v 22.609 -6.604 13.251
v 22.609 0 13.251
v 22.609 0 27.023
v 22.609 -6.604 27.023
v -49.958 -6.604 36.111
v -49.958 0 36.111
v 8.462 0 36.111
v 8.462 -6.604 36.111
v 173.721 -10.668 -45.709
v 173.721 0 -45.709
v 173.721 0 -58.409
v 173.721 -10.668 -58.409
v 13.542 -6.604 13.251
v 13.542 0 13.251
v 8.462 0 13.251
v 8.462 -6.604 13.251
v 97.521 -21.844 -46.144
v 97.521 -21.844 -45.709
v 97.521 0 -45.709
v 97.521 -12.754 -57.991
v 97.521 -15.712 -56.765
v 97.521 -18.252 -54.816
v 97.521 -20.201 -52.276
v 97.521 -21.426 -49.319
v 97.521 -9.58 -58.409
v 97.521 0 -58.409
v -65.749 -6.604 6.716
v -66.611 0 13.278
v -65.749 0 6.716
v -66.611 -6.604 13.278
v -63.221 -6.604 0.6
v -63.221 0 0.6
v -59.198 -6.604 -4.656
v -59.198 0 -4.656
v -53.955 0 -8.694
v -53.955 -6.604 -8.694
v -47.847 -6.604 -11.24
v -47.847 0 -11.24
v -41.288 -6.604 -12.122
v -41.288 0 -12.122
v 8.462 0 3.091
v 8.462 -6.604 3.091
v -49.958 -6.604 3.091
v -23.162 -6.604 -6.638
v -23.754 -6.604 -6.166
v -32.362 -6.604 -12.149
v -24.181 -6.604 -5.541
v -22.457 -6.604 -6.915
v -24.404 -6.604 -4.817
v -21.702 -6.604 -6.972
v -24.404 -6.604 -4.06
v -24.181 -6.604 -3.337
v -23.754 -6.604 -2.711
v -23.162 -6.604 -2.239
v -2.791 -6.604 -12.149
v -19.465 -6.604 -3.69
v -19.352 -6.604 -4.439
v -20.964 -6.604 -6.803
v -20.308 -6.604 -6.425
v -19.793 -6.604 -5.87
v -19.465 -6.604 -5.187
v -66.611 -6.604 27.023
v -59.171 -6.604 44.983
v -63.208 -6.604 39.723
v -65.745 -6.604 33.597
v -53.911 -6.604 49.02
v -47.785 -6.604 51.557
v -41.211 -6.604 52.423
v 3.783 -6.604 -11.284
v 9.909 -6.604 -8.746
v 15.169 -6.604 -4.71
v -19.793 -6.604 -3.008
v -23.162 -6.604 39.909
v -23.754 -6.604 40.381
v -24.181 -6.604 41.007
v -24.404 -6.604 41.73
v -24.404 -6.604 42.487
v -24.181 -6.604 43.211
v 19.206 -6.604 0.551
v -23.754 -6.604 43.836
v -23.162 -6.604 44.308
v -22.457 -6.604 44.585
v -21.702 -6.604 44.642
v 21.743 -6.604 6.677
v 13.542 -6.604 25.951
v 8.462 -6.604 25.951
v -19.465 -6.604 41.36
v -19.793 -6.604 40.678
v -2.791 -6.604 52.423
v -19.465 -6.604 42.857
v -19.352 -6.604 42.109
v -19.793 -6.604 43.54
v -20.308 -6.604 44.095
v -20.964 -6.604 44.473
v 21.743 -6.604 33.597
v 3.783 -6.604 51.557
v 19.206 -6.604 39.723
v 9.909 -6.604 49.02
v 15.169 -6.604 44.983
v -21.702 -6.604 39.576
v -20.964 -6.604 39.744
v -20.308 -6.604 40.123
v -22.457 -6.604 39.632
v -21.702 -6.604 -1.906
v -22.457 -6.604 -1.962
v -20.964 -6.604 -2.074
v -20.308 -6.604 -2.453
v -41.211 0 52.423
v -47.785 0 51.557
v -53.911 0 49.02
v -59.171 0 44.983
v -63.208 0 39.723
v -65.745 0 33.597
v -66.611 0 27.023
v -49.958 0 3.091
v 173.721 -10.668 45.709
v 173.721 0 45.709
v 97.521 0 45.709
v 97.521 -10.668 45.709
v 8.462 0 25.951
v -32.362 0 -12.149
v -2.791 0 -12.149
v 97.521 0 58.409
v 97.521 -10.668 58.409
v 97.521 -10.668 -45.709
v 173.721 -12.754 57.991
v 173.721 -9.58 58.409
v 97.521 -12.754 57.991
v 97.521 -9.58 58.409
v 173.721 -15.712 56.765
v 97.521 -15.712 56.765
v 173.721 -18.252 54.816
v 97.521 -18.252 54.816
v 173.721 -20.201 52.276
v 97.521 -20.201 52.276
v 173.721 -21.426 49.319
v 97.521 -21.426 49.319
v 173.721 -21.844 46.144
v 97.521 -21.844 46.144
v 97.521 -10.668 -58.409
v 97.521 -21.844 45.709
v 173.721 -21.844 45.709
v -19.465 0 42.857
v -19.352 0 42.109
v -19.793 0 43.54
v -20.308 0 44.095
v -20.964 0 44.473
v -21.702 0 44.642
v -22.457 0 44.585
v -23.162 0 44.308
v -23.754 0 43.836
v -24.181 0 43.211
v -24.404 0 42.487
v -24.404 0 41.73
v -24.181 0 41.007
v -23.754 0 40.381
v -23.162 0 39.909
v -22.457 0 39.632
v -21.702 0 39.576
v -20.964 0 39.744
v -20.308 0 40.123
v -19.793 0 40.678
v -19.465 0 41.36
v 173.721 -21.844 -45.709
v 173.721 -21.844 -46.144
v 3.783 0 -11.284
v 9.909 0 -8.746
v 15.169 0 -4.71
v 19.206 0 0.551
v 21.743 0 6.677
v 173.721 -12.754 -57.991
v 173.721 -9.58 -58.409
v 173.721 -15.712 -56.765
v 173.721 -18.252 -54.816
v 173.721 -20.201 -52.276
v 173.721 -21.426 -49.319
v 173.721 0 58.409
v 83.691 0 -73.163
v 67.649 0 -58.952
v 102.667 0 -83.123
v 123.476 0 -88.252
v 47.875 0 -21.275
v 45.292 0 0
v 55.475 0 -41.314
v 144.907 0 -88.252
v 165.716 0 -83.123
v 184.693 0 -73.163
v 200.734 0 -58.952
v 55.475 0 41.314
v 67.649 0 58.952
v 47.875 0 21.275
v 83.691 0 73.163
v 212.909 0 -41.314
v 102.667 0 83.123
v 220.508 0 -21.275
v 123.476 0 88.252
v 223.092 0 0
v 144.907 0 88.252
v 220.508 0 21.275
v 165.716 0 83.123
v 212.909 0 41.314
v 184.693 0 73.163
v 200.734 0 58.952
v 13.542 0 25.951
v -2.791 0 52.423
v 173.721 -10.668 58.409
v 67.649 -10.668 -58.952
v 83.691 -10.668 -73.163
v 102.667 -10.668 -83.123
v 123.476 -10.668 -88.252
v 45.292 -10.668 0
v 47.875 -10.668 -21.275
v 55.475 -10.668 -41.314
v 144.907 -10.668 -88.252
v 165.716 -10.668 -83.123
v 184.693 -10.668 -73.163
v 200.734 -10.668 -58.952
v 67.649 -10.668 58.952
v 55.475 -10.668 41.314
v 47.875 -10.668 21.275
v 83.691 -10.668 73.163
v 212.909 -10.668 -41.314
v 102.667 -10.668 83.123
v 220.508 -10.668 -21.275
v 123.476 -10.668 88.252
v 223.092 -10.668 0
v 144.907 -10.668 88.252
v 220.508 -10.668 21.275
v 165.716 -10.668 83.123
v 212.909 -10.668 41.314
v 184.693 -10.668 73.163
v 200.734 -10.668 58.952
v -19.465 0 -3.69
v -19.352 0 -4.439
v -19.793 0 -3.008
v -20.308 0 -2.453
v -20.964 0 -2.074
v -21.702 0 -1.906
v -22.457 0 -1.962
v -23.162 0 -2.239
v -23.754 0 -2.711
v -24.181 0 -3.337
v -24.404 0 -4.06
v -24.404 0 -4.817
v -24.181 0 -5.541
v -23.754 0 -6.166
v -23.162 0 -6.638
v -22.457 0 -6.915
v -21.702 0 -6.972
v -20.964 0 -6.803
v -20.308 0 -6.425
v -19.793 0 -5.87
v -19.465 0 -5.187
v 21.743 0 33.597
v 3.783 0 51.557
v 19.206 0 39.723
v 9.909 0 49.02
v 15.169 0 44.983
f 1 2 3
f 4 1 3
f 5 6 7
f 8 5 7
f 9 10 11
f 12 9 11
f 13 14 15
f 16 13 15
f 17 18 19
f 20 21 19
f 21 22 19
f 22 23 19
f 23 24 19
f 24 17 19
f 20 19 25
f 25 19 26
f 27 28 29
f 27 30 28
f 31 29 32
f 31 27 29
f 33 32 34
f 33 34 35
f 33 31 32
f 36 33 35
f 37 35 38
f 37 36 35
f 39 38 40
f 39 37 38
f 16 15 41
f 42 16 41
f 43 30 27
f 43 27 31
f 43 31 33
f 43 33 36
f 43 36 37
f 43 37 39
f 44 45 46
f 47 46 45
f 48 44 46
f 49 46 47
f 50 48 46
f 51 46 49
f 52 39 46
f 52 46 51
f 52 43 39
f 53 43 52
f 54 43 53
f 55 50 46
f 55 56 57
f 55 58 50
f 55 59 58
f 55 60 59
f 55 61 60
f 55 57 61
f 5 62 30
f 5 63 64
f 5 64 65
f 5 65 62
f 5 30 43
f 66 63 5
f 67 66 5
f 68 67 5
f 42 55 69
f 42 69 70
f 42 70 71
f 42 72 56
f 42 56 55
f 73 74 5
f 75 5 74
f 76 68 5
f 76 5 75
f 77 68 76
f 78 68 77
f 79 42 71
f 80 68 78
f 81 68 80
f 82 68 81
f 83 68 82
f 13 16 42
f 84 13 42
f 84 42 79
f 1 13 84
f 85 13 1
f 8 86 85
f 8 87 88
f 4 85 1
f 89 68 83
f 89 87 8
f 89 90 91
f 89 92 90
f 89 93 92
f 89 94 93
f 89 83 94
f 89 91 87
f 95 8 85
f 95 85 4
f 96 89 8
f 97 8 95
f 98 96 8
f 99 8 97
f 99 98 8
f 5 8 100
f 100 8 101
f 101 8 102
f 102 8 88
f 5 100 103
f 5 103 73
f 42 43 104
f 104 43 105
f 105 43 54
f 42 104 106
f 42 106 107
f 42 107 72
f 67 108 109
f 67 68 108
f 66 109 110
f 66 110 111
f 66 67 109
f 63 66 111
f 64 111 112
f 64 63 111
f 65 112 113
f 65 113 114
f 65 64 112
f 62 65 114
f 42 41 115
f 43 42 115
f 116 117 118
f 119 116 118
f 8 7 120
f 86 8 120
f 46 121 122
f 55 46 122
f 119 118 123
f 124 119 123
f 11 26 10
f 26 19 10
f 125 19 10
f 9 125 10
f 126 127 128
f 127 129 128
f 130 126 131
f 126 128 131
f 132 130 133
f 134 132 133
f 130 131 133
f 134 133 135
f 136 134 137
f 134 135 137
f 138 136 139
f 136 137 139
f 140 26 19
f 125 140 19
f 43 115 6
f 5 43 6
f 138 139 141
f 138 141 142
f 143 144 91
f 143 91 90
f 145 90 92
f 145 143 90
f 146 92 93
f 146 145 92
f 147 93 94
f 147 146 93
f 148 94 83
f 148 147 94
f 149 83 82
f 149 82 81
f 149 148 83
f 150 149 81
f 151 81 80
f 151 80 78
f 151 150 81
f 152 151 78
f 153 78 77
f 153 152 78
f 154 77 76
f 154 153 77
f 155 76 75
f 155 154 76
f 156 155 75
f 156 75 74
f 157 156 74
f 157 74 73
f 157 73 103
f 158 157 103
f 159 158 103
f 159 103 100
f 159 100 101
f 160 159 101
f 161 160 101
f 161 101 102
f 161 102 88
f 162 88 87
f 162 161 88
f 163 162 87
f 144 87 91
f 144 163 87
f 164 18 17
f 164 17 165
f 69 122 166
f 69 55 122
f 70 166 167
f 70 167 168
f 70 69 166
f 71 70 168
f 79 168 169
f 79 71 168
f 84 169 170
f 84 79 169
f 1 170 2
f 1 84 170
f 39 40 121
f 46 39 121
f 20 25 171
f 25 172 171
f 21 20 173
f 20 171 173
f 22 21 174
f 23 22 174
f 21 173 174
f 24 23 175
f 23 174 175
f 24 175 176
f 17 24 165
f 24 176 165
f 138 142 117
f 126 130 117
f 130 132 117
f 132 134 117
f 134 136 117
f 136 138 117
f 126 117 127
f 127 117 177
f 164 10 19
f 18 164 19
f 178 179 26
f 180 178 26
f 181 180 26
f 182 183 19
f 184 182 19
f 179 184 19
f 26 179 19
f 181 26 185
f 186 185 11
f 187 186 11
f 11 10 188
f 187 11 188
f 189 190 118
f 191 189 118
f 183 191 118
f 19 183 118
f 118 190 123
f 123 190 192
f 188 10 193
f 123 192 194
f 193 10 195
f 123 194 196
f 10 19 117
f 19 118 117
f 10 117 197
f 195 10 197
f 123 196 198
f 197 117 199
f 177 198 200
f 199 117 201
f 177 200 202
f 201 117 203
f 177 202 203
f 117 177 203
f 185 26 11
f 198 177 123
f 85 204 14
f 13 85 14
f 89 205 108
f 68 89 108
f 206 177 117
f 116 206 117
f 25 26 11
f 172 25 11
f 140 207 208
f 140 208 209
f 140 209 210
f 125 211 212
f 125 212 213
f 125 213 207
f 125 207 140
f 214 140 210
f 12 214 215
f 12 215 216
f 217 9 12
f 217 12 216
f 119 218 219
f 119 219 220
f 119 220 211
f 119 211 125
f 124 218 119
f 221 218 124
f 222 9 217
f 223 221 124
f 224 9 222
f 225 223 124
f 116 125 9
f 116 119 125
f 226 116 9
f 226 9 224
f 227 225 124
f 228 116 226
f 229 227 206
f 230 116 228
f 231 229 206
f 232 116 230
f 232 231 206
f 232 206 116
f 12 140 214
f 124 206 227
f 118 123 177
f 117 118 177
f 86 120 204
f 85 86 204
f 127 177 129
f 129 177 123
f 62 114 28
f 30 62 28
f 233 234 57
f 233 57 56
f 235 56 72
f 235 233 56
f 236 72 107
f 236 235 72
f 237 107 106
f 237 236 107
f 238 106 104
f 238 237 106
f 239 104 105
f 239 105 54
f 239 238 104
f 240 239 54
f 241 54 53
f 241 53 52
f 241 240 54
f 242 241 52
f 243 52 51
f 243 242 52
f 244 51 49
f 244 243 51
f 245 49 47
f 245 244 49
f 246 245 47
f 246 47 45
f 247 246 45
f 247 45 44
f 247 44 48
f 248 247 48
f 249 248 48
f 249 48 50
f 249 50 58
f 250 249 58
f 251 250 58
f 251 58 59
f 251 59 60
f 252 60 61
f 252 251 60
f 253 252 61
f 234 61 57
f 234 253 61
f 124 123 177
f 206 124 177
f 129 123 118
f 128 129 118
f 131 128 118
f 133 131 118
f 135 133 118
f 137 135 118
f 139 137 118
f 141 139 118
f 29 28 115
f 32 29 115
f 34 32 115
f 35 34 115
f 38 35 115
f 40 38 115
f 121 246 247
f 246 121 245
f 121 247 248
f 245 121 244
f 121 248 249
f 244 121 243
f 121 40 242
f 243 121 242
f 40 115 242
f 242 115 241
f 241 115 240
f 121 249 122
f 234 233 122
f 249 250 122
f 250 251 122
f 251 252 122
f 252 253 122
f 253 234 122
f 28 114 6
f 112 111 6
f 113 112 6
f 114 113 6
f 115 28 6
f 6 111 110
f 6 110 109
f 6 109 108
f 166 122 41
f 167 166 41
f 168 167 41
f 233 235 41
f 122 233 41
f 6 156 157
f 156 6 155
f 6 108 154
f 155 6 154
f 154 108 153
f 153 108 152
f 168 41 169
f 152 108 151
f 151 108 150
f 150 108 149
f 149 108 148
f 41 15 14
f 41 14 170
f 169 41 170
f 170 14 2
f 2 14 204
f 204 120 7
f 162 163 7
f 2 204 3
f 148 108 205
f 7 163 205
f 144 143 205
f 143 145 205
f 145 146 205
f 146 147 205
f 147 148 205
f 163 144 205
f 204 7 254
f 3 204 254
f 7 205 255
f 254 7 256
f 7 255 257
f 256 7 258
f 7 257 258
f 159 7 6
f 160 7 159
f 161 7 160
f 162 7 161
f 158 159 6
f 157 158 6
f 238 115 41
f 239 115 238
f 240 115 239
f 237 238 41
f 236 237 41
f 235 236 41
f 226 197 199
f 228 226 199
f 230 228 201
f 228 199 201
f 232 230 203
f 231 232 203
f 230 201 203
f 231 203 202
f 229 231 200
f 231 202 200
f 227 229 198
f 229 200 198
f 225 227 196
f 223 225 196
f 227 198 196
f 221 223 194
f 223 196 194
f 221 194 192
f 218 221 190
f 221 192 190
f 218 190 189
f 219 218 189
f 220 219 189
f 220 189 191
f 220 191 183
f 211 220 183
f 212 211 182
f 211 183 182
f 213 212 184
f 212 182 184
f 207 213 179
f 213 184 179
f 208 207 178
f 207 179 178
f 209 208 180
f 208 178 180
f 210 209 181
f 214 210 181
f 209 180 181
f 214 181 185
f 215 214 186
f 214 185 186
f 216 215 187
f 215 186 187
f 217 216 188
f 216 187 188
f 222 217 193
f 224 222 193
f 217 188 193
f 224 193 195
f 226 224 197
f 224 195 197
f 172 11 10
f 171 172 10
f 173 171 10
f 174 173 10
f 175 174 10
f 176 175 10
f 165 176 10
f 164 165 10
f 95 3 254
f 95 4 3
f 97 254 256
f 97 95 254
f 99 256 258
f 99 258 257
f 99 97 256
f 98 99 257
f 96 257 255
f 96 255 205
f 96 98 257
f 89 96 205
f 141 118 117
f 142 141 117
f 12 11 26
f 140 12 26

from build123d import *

# Parameters (mm, degrees)
F0_R       = 2.54
F1_DEPTH   = 6.604
F2_R       = 25.4
F3_R       = 25.4
F4_R       = 25.4
F5_R       = 25.4
F7_DEPTH   = 21.844
F6_R       = 88.9
F6_R_2     = 2.54
F8_DEPTH   = 10.668
F9_R       = 12.264205
F10_R      = 12.264205
F12_D      = 17.78
F11_R      = 8.89
F13_DEPTH  = 7.62
F13_FACE_R = 8.89
F14_DEPTH  = 3.048
F15_R      = 8.89
F16_DEPTH  = 2.032
F17_DEPTH  = 2.286
F18_R      = 8.89
F19_DEPTH  = 5.334
F1_FACE_W  = 6.604
F1_FACE_H  = 33.02
F20_DEPTH  = 5.08


with BuildPart() as f1:
    # F0 (on Front) → F1 (new body)
    with BuildSketch(Plane.XZ):
        Polygon((-66.610932, -12.045752), (-32.362044, -12.149008), (22.608856, -12.149008), (22.608856, 52.422736), (-66.610932, 52.422736), align=None)
        with Locations((-21.892127, -4.438743)):
            Circle(F0_R, mode=Mode.SUBTRACT)
        Polygon((-49.957503, 3.090992), (-49.957503, 36.110992), (8.462497, 36.110992), (8.462497, 25.950992), (13.542497, 25.950992), (13.542497, 13.250992), (8.462497, 13.250992), (8.462497, 3.090992), align=None, mode=Mode.SUBTRACT)
        with Locations((-21.892127, 42.108711)):
            Circle(F0_R, mode=Mode.SUBTRACT)
    extrude(amount=F1_DEPTH)

    # F2
    f2_edges = [f1.edges().sort_by_distance(p)[0] for p in [
        (22.608856, -3.302, -12.149008),
    ]]
    fillet(f2_edges, radius=F2_R)

    # F3
    f3_edges = [f1.edges().sort_by_distance(p)[0] for p in [
        (22.608856, -3.302, 52.422736),
    ]]
    fillet(f3_edges, radius=F3_R)

    # F4
    f4_edges = [f1.edges().sort_by_distance(p)[0] for p in [
        (-66.610932, -3.302, 52.422736),
    ]]
    fillet(f4_edges, radius=F4_R)

    # F5
    f5_edges = [f1.edges().sort_by_distance(p)[0] for p in [
        (-66.610932, -3.302, -12.045752),
    ]]
    fillet(f5_edges, radius=F5_R)

    # F1_face (on face) → F20 (join)
    with BuildSketch(Plane(origin=(-49.957503, -3.302, 19.600992), x_dir=(0, 1, 0), z_dir=(1, 0, 0))):
        Rectangle(F1_FACE_W, F1_FACE_H)
    extrude(amount=-F20_DEPTH)


with BuildPart() as f7:
    # F6 (on Front) → F7 (new body)
    with BuildSketch(Plane.XZ):
        Polygon((173.720603, 58.408517), (135.620603, 58.408517), (97.520603, 58.408517), (97.520603, 45.708517), (173.720603, 45.708517), align=None)
        Polygon((97.520603, -58.408517), (135.620603, -58.408517), (173.720603, -58.408517), (173.720603, -45.708517), (97.520603, -45.708517), align=None)
    extrude(amount=F7_DEPTH)

    # F9
    f9_edges = [f7.edges().sort_by_distance(p)[0] for p in [
        (135.620603, -21.844, -58.408517),
    ]]
    fillet(f9_edges, radius=F9_R)

    # F10
    f10_edges = [f7.edges().sort_by_distance(p)[0] for p in [
        (135.620603, -21.844, 58.408517),
    ]]
    fillet(f10_edges, radius=F10_R)


with BuildPart() as f8:
    # F6 (on Front) → F8 (new body)
    with BuildSketch(Plane.XZ):
        with Locations((134.191751, 0)):
            Circle(F6_R)
        Polygon((173.720603, -58.408517), (135.620603, -58.408517), (97.520603, -58.408517), (97.520603, -45.708517), (173.720603, -45.708517), align=None, mode=Mode.SUBTRACT)
        with Locations((134.191751, 0)):
            Circle(F6_R_2, mode=Mode.SUBTRACT)
        Polygon((97.520603, 58.408517), (135.620603, 58.408517), (173.720603, 58.408517), (173.720603, 45.708517), (97.520603, 45.708517), align=None, mode=Mode.SUBTRACT)
    extrude(amount=F8_DEPTH)

    # F12 (through all)
    with Locations(Plane(origin=(0, 0, 0), x_dir=(1, 0, 0), z_dir=(0, 1, 0))):
        with Locations((134.202927, 0)):
            Hole(F12_D / 2)

    # F11 (on Front) → F13 (join)
    with BuildSketch(Plane.XZ):
        with Locations((134.202927, 0)):
            Circle(F11_R)
    extrude(amount=F13_DEPTH)

    # F13_face (on face) → F14 (join)
    with BuildSketch(Plane(origin=(134.202927, -7.62, 0), x_dir=(1, 0, 0), z_dir=(0, -1, 0))):
        Circle(F13_FACE_R)
    extrude(amount=F14_DEPTH)

    # F15 (on Front) → F16 (join)
    with BuildSketch(Plane.XZ):
        with Locations((132.709876, 0)):
            Circle(F15_R)
    extrude(amount=F16_DEPTH)

    # F15 (on Front) → F17 (join)
    with BuildSketch(Plane.XZ):
        with Locations((132.709876, 0)):
            Circle(F15_R)
    extrude(amount=F17_DEPTH)

    # F18 (on Front) → F19 (join)
    with BuildSketch(Plane.XZ):
        with Locations((135.060295, 0)):
            Circle(F18_R)
    extrude(amount=F19_DEPTH)


solid = Compound([f1.part, f7.part, f8.part])
